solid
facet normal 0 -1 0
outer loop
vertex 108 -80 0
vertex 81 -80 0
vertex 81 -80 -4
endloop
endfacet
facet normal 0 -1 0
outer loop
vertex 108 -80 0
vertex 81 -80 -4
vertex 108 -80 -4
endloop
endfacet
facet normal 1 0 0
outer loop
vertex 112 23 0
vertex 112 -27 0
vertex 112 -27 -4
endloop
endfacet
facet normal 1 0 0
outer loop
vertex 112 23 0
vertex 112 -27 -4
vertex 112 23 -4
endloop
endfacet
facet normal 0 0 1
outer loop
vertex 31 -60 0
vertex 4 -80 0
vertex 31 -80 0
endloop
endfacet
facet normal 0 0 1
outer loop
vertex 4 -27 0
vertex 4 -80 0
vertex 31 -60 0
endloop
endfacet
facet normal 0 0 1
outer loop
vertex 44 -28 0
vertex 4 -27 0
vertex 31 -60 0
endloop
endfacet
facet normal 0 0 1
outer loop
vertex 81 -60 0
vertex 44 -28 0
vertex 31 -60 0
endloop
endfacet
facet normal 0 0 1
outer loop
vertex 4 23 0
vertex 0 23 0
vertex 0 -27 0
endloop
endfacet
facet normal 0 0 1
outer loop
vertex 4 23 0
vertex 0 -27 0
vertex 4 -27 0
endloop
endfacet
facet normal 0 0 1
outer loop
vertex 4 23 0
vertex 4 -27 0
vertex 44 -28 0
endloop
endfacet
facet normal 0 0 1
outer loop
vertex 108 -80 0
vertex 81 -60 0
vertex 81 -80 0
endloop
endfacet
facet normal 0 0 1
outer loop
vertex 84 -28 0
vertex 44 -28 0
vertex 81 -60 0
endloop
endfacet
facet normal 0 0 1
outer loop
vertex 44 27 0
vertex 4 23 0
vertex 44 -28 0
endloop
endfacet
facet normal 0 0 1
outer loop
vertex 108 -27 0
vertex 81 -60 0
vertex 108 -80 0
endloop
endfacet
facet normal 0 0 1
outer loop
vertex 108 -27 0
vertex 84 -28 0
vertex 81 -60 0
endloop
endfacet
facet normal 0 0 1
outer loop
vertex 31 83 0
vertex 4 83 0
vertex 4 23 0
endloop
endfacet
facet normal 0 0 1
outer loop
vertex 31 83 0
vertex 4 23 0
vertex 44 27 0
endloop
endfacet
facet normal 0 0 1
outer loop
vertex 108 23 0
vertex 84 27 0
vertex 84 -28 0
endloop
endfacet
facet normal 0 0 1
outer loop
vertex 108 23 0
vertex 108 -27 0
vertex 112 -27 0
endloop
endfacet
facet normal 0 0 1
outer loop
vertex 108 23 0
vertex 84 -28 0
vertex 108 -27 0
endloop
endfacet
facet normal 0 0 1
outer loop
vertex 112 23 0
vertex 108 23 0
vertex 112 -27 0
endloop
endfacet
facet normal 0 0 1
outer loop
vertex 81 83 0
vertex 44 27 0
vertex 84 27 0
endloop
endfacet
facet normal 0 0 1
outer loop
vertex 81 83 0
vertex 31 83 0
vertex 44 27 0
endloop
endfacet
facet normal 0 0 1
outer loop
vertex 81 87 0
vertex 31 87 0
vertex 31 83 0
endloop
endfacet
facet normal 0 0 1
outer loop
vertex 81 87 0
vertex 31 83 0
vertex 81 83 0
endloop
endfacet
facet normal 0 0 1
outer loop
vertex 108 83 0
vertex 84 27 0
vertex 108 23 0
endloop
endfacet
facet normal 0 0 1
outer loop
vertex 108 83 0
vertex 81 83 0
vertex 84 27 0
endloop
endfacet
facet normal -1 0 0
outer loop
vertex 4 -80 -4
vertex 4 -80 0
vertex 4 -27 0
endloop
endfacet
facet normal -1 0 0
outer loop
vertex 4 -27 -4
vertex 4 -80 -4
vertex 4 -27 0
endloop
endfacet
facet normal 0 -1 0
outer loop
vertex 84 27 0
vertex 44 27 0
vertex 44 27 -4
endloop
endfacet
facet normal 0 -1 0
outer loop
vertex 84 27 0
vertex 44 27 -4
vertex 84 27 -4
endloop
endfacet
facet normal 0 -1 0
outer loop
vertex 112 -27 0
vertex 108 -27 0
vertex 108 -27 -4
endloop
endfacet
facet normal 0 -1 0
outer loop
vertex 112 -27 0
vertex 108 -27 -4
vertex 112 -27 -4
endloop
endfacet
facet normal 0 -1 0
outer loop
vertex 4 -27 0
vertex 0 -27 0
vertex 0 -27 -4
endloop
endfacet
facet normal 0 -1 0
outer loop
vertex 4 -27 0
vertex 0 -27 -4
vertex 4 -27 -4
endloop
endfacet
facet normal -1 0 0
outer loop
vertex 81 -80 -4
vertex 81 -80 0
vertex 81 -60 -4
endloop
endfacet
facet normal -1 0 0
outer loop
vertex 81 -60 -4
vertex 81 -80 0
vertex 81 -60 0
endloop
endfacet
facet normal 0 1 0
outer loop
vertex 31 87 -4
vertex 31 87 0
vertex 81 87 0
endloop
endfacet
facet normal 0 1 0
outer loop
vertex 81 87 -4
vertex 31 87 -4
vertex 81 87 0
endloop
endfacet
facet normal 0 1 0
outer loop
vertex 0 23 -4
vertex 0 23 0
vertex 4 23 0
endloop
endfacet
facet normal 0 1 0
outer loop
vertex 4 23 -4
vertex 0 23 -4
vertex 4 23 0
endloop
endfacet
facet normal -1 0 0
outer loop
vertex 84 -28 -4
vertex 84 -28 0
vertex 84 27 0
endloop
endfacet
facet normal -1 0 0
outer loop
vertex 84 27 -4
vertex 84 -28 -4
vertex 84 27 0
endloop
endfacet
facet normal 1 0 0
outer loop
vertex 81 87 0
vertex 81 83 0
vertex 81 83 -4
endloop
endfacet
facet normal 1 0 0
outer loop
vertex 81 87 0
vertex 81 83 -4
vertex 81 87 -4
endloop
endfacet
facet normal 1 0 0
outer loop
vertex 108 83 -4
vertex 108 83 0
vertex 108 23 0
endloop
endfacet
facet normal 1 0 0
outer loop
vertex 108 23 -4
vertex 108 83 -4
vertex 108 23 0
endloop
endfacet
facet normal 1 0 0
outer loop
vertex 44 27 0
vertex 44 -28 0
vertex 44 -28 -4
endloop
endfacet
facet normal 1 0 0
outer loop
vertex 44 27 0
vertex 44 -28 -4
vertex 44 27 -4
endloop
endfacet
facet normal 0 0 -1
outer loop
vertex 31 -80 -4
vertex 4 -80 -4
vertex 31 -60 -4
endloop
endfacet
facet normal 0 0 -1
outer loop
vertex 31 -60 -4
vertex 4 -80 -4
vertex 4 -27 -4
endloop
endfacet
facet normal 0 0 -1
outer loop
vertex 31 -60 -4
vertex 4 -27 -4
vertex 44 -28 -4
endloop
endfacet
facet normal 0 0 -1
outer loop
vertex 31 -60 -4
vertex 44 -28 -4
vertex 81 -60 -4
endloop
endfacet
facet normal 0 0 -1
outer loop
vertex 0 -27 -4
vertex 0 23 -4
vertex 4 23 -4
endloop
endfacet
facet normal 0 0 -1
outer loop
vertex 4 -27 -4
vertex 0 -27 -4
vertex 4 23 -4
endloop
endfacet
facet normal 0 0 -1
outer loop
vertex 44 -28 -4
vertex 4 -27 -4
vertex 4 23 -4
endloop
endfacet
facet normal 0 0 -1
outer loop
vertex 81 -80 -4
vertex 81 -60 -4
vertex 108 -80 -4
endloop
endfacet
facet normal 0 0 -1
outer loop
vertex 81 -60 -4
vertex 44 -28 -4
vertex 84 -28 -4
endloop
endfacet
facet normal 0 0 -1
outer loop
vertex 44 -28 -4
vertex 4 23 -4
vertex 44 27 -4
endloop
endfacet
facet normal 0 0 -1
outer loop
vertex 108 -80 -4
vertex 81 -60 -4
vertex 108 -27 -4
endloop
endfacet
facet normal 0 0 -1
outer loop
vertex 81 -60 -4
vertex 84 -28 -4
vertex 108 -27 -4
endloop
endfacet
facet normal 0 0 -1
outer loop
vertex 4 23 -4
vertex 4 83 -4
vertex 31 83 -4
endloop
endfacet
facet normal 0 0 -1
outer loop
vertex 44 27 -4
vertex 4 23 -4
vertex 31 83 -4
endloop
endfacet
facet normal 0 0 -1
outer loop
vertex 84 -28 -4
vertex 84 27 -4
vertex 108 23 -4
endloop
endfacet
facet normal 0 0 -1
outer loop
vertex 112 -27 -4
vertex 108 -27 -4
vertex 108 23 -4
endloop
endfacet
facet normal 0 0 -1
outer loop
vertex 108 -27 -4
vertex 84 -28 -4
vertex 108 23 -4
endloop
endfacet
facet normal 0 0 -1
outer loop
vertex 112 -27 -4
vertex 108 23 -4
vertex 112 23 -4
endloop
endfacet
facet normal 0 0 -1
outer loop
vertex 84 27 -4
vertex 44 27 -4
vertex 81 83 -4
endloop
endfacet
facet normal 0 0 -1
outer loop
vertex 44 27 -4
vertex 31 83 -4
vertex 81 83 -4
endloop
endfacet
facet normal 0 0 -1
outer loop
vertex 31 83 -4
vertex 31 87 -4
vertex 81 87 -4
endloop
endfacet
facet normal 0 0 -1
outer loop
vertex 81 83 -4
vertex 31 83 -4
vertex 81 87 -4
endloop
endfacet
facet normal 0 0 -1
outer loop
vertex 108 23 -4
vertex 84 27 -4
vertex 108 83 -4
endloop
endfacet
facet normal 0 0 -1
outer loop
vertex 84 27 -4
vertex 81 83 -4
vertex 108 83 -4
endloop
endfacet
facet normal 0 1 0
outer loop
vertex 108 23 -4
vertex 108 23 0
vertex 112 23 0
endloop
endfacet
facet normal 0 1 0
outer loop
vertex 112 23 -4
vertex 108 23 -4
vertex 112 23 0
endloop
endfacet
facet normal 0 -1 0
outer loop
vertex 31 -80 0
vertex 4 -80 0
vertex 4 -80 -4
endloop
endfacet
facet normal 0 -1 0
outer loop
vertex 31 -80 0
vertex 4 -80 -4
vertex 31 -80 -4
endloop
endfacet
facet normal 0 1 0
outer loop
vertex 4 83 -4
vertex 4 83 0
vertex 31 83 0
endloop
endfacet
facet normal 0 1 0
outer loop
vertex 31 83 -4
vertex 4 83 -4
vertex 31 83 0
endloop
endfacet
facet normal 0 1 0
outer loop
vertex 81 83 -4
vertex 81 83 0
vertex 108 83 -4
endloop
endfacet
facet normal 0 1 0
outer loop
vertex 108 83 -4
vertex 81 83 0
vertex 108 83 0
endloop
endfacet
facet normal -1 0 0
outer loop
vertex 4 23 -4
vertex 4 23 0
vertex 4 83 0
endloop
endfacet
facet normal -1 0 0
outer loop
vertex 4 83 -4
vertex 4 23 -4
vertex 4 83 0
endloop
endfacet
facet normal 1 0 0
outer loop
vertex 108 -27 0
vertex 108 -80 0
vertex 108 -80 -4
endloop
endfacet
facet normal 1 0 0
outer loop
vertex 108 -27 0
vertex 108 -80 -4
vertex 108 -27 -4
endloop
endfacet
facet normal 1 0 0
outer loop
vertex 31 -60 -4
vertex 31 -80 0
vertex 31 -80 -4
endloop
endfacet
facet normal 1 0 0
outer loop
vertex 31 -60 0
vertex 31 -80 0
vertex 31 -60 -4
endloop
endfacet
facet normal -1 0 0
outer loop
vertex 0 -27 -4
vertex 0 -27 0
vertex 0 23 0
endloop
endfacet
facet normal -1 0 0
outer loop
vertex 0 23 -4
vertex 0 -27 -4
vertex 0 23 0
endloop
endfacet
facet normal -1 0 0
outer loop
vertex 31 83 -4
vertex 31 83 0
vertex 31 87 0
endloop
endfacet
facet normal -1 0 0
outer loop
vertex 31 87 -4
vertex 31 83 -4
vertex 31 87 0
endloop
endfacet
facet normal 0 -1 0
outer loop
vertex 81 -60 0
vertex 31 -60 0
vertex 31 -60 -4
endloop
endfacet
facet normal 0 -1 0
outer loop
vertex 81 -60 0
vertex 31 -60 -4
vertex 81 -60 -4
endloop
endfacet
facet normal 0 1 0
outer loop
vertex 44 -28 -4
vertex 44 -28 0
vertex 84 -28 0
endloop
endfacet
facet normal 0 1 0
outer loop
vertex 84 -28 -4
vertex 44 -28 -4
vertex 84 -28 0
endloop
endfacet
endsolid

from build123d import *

# Parameters (mm, degrees)
SKETCH_2_W          = 112
SKETCH_2_H          = 172
EXTRUDE_1_DEPTH     = 4
SKETCH_3_W          = 27
SKETCH_3_H          = 4
SKETCH_3_W_2        = 4
SKETCH_3_H_2        = 58
CUT_EXTRUDE_2_DEPTH = 4
SKETCH_5_W          = 104
SKETCH_5_H          = 5
CUT_EXTRUDE_4_DEPTH = 4
SKETCH_6_W          = 40
SKETCH_6_H          = 55
CUT_EXTRUDE_5_DEPTH = 4
SKETCH_8_W          = 50
SKETCH_8_H          = 20
CUT_EXTRUDE_6_DEPTH = 4


with BuildPart() as part:
    # 스케치2 → 보스-돌출1 (new body)
    with BuildSketch(Plane.XY):
        with Locations((56, 1)):
            Rectangle(SKETCH_2_W, SKETCH_2_H)
    extrude(amount=-EXTRUDE_1_DEPTH)

    # 스케치3 → 컷-돌출2 (cut)
    with BuildSketch(Plane.XY):
        with Locations((94.5, 85)):
            Rectangle(SKETCH_3_W, SKETCH_3_H)
        Polygon((112, 23), (112, 87), (108, 87), (108, 83), (108, 23), align=None)
        with Locations((17.5, 85)):
            Rectangle(SKETCH_3_W, SKETCH_3_H)
        Polygon((4, 83), (4, 87), (0, 87), (0, 23), (4, 23), align=None)
        with Locations((2, -56)):
            Rectangle(SKETCH_3_W_2, SKETCH_3_H_2)
        with Locations((110, -56)):
            Rectangle(SKETCH_3_W_2, SKETCH_3_H_2)
    extrude(amount=-CUT_EXTRUDE_2_DEPTH, mode=Mode.SUBTRACT)

    # 스케치5 → 컷-돌출4 (cut)
    with BuildSketch(Plane.XY):
        with Locations((56, -82.5)):
            Rectangle(SKETCH_5_W, SKETCH_5_H)
    extrude(amount=-CUT_EXTRUDE_4_DEPTH, mode=Mode.SUBTRACT)

    # 스케치6 → 컷-돌출5 (cut)
    with BuildSketch(Plane.XY):
        with Locations((64, -0.5)):
            Rectangle(SKETCH_6_W, SKETCH_6_H)
    extrude(amount=-CUT_EXTRUDE_5_DEPTH, mode=Mode.SUBTRACT)

    # 스케치8 → 컷-돌출6 (cut)
    with BuildSketch(Plane.XY):
        with Locations((56, -70)):
            Rectangle(SKETCH_8_W, SKETCH_8_H)
    extrude(amount=-CUT_EXTRUDE_6_DEPTH, mode=Mode.SUBTRACT)


solid = part.part
